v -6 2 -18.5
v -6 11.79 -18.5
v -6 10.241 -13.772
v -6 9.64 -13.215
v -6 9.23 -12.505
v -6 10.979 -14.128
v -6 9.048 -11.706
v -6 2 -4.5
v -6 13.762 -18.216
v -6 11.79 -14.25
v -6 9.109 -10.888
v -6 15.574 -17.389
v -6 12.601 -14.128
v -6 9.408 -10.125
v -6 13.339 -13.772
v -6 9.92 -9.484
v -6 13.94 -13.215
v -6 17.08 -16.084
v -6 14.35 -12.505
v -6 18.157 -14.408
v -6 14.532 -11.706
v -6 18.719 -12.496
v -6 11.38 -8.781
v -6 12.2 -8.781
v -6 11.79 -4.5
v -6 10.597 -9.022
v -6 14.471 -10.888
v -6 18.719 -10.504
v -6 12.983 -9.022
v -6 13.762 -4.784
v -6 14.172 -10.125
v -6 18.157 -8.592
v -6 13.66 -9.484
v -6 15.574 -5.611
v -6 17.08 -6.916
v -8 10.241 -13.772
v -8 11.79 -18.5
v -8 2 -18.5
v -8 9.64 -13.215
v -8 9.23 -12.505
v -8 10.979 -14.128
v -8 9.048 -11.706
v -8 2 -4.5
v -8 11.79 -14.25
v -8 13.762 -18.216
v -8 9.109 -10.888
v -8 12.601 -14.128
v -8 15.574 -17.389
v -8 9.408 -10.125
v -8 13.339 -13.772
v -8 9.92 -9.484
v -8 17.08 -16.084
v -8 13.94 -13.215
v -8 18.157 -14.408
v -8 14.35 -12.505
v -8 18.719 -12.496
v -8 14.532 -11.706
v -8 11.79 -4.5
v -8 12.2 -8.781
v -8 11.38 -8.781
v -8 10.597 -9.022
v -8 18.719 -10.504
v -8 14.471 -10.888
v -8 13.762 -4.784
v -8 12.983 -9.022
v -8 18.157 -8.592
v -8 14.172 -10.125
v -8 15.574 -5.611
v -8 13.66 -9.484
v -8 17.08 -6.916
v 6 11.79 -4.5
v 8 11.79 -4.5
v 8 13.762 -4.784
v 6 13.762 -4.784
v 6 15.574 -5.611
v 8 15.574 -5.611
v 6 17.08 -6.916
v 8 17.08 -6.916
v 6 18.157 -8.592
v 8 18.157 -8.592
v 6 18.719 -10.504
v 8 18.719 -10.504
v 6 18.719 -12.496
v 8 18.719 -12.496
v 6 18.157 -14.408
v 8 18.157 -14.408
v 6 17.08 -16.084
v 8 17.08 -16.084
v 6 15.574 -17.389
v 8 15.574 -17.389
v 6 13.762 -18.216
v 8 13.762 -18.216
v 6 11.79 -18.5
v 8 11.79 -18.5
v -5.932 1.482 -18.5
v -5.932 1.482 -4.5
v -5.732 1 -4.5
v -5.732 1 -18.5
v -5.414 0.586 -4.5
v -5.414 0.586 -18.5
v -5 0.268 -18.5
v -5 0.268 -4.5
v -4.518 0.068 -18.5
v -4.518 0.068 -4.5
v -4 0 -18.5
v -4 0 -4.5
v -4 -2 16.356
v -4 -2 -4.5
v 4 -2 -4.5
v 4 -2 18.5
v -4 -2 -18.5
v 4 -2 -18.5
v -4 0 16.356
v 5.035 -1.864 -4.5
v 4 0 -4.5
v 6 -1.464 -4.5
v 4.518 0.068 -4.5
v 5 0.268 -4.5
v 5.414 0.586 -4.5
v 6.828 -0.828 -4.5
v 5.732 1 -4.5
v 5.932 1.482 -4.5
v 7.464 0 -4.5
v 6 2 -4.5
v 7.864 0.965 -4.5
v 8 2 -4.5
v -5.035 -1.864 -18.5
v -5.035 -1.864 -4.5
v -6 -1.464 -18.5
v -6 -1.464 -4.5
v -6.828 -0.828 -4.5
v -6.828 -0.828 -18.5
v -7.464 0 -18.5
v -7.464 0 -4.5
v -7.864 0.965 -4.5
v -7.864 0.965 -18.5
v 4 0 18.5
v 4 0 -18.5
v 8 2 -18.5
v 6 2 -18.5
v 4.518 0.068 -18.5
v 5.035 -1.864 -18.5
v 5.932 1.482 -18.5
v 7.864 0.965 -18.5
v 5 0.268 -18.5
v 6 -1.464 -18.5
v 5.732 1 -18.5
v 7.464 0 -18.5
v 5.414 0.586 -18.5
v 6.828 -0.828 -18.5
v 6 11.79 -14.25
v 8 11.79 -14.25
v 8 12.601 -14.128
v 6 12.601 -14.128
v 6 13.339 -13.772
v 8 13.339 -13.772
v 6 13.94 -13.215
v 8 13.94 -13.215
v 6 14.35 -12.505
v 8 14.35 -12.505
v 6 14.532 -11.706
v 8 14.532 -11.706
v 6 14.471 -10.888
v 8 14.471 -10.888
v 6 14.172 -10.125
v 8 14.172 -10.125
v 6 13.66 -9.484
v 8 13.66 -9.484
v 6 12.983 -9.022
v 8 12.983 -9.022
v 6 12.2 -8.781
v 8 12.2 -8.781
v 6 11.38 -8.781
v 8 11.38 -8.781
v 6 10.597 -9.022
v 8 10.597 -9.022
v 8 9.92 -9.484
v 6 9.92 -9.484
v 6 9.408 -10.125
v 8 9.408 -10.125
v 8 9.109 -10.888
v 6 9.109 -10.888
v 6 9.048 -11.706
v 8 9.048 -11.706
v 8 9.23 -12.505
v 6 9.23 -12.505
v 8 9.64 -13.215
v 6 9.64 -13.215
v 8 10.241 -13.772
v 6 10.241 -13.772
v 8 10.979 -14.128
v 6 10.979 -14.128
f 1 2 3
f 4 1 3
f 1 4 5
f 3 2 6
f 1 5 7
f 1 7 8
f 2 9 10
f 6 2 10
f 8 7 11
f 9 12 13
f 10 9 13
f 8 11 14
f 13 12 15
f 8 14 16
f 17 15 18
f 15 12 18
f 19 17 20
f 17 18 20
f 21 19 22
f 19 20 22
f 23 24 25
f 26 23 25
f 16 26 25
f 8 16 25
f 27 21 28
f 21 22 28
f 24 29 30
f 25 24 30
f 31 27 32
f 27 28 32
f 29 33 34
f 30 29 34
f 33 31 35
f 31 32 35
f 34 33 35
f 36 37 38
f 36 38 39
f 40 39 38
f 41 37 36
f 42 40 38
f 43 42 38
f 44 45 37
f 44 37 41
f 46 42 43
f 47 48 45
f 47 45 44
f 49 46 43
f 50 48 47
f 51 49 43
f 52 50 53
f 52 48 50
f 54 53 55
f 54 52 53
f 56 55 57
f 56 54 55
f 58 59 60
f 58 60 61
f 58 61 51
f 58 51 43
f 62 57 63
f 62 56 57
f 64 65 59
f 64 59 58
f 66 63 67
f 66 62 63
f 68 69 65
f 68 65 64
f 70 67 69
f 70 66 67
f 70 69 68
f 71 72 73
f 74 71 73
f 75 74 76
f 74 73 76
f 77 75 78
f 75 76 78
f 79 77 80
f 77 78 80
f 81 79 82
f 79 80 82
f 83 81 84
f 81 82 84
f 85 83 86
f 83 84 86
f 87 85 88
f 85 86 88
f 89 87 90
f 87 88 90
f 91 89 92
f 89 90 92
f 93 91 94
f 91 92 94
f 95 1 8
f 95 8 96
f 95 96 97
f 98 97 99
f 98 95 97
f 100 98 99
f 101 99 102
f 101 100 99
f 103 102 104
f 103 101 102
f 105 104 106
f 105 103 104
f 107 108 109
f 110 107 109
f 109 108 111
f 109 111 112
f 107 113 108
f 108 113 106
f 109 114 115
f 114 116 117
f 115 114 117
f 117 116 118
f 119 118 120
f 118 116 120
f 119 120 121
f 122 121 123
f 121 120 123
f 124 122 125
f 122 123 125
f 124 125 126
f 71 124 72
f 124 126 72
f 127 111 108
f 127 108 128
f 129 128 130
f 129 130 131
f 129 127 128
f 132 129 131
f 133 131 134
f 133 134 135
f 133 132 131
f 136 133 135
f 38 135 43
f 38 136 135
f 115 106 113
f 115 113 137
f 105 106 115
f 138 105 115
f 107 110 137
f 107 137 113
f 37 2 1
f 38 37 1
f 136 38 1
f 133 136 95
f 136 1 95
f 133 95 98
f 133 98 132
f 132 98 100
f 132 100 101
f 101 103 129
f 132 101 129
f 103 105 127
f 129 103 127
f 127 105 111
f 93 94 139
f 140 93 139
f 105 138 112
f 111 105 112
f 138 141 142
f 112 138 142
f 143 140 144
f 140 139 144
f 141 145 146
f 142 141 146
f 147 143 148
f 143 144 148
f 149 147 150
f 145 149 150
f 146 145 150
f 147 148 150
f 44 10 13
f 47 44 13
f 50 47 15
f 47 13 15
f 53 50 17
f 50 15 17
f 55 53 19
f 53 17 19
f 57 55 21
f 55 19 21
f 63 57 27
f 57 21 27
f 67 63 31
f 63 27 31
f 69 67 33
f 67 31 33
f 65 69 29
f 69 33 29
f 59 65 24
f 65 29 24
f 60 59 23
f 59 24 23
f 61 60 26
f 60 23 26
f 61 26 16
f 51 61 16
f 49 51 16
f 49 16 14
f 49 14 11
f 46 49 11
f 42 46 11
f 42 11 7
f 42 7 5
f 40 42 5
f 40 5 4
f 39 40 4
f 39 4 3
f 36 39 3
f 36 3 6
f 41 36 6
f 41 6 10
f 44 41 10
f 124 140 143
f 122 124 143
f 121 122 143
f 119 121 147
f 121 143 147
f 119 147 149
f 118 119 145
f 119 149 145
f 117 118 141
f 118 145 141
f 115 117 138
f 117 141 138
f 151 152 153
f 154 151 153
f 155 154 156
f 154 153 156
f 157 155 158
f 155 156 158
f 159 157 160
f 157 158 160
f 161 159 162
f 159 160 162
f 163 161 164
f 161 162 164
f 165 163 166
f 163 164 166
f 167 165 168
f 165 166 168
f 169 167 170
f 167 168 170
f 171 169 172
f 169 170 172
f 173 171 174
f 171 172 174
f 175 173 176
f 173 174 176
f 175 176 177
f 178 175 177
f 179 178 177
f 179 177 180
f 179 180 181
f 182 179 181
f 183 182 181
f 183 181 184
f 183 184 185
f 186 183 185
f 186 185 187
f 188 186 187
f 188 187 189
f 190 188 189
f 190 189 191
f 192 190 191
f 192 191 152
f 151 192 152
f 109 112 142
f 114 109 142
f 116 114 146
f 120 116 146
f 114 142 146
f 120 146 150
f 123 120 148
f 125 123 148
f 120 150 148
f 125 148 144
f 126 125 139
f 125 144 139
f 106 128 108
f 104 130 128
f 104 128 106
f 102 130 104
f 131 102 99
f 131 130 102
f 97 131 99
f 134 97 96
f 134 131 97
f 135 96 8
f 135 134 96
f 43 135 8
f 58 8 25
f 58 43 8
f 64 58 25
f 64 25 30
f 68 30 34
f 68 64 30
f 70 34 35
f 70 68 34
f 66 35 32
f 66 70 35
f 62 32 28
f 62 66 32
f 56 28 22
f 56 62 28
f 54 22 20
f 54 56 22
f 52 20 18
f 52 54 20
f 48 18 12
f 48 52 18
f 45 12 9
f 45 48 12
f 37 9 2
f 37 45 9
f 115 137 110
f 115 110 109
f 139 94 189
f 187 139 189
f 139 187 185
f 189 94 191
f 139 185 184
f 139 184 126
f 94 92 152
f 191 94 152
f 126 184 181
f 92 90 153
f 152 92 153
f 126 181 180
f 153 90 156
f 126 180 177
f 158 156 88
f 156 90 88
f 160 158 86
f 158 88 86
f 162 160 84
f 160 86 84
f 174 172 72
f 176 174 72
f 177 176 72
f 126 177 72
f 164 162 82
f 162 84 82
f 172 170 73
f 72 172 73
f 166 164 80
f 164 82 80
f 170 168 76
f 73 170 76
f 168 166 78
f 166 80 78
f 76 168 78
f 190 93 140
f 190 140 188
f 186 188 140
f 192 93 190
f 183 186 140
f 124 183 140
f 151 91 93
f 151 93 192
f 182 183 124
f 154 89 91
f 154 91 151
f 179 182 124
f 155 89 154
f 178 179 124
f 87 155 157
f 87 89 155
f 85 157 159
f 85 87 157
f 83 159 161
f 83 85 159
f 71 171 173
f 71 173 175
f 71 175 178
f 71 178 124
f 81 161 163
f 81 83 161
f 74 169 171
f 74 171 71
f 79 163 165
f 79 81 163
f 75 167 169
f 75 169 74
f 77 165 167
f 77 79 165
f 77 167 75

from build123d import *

# Parameters (mm, degrees)
SKETCH_2_W                  = 8
SKETCH_2_H                  = 37
SM_BASE_FLANGE_1_DEPTH      = 2
SM_EDGE_FLANGE_1_DEPTH      = 14
SM_START                    = 2
SM_EDGE_FLANGE_1_FLAT_DEPTH = 2
HOLE_WIZARD_M5_2_D          = 5.5
CUT_EXTRUDE_1_DEPTH         = 28.555654592
CUT_EXTRUDE_1_DEPTH_BACK    = 28.555654592


# Sheet-metal steps are written as plain solids
with BuildPart() as part:
    # Sketch 2 → 基体-法兰1 (new body)
    with BuildSketch(Plane(origin=(0, 0, 0), x_dir=(1, 0, 0), z_dir=(0, 1, 0))):
        Rectangle(SKETCH_2_W, SKETCH_2_H)
    extrude(amount=-SM_BASE_FLANGE_1_DEPTH)

    # 边线-法兰1 bend section (across the edge) → 边线-法兰1 (add)
    with BuildSketch(Plane(origin=(-6, 0, -18.5), x_dir=(1, 0, 0), z_dir=(0, 0, 1))):
        with BuildLine():
            Line((-2, 2), (0, 2))
            ThreePointArc((0, 2), (0.585786438, 0.585786438), (2, 0))
            Line((2, 0), (2, -2))
            ThreePointArc((2, -2), (-0.828427125, -0.828427125), (-2, 2))
        make_face()
    sm_edge_flange_1 = extrude(amount=SM_EDGE_FLANGE_1_DEPTH)

    # 边线-法兰1 profile (on flange) → 边线-法兰1 flat (add)
    with BuildSketch(Plane.ZY.offset(6).offset(SM_START)):
        with BuildLine():
            ThreePointArc((-4.5, 11.79), (-11.5, 18.79), (-18.5, 11.79))
            Line((-18.5, 11.79), (-18.5, 2))
            Line((-18.5, 2), (-4.5, 2))
            Line((-4.5, 2), (-4.5, 11.79))
        make_face()
    sm_edge_flange_1_flat = extrude(amount=-SM_EDGE_FLANGE_1_FLAT_DEPTH)

    # 镜向1: 边线-法兰1, 边线-法兰1 flat across plane
    add(sm_edge_flange_1.mirror(Plane(origin=(0, 0, 0), x_dir=(0, 0, 1), z_dir=(1, 0, 0))))
    add(sm_edge_flange_1_flat.mirror(Plane(origin=(0, 0, 0), x_dir=(0, 0, 1), z_dir=(1, 0, 0))))

    # M5 间隙孔2 (through all)
    with Locations(Plane.ZY.offset(8)):
        with Locations((-11.5, 11.79)):
            Hole(HOLE_WIZARD_M5_2_D / 2)

    # 草图22 → 切除-拉伸1 (cut, two sides: drawn at the far end of the back side and taken through both)
    with BuildSketch(Plane(origin=(0, 0, 0), x_dir=(1, 0, 0), z_dir=(0, 1, 0)).offset(-CUT_EXTRUDE_1_DEPTH_BACK)):
        Polygon((88.803072858, -41.222914888), (4, -18.5), (-4, -16.356406461), (-88.803072858, 6.366508427), (-134.248902633, -163.239637288), (43.357243082, -210.829060603), align=None)
    extrude(amount=CUT_EXTRUDE_1_DEPTH + CUT_EXTRUDE_1_DEPTH_BACK, mode=Mode.SUBTRACT)


solid = part.part
